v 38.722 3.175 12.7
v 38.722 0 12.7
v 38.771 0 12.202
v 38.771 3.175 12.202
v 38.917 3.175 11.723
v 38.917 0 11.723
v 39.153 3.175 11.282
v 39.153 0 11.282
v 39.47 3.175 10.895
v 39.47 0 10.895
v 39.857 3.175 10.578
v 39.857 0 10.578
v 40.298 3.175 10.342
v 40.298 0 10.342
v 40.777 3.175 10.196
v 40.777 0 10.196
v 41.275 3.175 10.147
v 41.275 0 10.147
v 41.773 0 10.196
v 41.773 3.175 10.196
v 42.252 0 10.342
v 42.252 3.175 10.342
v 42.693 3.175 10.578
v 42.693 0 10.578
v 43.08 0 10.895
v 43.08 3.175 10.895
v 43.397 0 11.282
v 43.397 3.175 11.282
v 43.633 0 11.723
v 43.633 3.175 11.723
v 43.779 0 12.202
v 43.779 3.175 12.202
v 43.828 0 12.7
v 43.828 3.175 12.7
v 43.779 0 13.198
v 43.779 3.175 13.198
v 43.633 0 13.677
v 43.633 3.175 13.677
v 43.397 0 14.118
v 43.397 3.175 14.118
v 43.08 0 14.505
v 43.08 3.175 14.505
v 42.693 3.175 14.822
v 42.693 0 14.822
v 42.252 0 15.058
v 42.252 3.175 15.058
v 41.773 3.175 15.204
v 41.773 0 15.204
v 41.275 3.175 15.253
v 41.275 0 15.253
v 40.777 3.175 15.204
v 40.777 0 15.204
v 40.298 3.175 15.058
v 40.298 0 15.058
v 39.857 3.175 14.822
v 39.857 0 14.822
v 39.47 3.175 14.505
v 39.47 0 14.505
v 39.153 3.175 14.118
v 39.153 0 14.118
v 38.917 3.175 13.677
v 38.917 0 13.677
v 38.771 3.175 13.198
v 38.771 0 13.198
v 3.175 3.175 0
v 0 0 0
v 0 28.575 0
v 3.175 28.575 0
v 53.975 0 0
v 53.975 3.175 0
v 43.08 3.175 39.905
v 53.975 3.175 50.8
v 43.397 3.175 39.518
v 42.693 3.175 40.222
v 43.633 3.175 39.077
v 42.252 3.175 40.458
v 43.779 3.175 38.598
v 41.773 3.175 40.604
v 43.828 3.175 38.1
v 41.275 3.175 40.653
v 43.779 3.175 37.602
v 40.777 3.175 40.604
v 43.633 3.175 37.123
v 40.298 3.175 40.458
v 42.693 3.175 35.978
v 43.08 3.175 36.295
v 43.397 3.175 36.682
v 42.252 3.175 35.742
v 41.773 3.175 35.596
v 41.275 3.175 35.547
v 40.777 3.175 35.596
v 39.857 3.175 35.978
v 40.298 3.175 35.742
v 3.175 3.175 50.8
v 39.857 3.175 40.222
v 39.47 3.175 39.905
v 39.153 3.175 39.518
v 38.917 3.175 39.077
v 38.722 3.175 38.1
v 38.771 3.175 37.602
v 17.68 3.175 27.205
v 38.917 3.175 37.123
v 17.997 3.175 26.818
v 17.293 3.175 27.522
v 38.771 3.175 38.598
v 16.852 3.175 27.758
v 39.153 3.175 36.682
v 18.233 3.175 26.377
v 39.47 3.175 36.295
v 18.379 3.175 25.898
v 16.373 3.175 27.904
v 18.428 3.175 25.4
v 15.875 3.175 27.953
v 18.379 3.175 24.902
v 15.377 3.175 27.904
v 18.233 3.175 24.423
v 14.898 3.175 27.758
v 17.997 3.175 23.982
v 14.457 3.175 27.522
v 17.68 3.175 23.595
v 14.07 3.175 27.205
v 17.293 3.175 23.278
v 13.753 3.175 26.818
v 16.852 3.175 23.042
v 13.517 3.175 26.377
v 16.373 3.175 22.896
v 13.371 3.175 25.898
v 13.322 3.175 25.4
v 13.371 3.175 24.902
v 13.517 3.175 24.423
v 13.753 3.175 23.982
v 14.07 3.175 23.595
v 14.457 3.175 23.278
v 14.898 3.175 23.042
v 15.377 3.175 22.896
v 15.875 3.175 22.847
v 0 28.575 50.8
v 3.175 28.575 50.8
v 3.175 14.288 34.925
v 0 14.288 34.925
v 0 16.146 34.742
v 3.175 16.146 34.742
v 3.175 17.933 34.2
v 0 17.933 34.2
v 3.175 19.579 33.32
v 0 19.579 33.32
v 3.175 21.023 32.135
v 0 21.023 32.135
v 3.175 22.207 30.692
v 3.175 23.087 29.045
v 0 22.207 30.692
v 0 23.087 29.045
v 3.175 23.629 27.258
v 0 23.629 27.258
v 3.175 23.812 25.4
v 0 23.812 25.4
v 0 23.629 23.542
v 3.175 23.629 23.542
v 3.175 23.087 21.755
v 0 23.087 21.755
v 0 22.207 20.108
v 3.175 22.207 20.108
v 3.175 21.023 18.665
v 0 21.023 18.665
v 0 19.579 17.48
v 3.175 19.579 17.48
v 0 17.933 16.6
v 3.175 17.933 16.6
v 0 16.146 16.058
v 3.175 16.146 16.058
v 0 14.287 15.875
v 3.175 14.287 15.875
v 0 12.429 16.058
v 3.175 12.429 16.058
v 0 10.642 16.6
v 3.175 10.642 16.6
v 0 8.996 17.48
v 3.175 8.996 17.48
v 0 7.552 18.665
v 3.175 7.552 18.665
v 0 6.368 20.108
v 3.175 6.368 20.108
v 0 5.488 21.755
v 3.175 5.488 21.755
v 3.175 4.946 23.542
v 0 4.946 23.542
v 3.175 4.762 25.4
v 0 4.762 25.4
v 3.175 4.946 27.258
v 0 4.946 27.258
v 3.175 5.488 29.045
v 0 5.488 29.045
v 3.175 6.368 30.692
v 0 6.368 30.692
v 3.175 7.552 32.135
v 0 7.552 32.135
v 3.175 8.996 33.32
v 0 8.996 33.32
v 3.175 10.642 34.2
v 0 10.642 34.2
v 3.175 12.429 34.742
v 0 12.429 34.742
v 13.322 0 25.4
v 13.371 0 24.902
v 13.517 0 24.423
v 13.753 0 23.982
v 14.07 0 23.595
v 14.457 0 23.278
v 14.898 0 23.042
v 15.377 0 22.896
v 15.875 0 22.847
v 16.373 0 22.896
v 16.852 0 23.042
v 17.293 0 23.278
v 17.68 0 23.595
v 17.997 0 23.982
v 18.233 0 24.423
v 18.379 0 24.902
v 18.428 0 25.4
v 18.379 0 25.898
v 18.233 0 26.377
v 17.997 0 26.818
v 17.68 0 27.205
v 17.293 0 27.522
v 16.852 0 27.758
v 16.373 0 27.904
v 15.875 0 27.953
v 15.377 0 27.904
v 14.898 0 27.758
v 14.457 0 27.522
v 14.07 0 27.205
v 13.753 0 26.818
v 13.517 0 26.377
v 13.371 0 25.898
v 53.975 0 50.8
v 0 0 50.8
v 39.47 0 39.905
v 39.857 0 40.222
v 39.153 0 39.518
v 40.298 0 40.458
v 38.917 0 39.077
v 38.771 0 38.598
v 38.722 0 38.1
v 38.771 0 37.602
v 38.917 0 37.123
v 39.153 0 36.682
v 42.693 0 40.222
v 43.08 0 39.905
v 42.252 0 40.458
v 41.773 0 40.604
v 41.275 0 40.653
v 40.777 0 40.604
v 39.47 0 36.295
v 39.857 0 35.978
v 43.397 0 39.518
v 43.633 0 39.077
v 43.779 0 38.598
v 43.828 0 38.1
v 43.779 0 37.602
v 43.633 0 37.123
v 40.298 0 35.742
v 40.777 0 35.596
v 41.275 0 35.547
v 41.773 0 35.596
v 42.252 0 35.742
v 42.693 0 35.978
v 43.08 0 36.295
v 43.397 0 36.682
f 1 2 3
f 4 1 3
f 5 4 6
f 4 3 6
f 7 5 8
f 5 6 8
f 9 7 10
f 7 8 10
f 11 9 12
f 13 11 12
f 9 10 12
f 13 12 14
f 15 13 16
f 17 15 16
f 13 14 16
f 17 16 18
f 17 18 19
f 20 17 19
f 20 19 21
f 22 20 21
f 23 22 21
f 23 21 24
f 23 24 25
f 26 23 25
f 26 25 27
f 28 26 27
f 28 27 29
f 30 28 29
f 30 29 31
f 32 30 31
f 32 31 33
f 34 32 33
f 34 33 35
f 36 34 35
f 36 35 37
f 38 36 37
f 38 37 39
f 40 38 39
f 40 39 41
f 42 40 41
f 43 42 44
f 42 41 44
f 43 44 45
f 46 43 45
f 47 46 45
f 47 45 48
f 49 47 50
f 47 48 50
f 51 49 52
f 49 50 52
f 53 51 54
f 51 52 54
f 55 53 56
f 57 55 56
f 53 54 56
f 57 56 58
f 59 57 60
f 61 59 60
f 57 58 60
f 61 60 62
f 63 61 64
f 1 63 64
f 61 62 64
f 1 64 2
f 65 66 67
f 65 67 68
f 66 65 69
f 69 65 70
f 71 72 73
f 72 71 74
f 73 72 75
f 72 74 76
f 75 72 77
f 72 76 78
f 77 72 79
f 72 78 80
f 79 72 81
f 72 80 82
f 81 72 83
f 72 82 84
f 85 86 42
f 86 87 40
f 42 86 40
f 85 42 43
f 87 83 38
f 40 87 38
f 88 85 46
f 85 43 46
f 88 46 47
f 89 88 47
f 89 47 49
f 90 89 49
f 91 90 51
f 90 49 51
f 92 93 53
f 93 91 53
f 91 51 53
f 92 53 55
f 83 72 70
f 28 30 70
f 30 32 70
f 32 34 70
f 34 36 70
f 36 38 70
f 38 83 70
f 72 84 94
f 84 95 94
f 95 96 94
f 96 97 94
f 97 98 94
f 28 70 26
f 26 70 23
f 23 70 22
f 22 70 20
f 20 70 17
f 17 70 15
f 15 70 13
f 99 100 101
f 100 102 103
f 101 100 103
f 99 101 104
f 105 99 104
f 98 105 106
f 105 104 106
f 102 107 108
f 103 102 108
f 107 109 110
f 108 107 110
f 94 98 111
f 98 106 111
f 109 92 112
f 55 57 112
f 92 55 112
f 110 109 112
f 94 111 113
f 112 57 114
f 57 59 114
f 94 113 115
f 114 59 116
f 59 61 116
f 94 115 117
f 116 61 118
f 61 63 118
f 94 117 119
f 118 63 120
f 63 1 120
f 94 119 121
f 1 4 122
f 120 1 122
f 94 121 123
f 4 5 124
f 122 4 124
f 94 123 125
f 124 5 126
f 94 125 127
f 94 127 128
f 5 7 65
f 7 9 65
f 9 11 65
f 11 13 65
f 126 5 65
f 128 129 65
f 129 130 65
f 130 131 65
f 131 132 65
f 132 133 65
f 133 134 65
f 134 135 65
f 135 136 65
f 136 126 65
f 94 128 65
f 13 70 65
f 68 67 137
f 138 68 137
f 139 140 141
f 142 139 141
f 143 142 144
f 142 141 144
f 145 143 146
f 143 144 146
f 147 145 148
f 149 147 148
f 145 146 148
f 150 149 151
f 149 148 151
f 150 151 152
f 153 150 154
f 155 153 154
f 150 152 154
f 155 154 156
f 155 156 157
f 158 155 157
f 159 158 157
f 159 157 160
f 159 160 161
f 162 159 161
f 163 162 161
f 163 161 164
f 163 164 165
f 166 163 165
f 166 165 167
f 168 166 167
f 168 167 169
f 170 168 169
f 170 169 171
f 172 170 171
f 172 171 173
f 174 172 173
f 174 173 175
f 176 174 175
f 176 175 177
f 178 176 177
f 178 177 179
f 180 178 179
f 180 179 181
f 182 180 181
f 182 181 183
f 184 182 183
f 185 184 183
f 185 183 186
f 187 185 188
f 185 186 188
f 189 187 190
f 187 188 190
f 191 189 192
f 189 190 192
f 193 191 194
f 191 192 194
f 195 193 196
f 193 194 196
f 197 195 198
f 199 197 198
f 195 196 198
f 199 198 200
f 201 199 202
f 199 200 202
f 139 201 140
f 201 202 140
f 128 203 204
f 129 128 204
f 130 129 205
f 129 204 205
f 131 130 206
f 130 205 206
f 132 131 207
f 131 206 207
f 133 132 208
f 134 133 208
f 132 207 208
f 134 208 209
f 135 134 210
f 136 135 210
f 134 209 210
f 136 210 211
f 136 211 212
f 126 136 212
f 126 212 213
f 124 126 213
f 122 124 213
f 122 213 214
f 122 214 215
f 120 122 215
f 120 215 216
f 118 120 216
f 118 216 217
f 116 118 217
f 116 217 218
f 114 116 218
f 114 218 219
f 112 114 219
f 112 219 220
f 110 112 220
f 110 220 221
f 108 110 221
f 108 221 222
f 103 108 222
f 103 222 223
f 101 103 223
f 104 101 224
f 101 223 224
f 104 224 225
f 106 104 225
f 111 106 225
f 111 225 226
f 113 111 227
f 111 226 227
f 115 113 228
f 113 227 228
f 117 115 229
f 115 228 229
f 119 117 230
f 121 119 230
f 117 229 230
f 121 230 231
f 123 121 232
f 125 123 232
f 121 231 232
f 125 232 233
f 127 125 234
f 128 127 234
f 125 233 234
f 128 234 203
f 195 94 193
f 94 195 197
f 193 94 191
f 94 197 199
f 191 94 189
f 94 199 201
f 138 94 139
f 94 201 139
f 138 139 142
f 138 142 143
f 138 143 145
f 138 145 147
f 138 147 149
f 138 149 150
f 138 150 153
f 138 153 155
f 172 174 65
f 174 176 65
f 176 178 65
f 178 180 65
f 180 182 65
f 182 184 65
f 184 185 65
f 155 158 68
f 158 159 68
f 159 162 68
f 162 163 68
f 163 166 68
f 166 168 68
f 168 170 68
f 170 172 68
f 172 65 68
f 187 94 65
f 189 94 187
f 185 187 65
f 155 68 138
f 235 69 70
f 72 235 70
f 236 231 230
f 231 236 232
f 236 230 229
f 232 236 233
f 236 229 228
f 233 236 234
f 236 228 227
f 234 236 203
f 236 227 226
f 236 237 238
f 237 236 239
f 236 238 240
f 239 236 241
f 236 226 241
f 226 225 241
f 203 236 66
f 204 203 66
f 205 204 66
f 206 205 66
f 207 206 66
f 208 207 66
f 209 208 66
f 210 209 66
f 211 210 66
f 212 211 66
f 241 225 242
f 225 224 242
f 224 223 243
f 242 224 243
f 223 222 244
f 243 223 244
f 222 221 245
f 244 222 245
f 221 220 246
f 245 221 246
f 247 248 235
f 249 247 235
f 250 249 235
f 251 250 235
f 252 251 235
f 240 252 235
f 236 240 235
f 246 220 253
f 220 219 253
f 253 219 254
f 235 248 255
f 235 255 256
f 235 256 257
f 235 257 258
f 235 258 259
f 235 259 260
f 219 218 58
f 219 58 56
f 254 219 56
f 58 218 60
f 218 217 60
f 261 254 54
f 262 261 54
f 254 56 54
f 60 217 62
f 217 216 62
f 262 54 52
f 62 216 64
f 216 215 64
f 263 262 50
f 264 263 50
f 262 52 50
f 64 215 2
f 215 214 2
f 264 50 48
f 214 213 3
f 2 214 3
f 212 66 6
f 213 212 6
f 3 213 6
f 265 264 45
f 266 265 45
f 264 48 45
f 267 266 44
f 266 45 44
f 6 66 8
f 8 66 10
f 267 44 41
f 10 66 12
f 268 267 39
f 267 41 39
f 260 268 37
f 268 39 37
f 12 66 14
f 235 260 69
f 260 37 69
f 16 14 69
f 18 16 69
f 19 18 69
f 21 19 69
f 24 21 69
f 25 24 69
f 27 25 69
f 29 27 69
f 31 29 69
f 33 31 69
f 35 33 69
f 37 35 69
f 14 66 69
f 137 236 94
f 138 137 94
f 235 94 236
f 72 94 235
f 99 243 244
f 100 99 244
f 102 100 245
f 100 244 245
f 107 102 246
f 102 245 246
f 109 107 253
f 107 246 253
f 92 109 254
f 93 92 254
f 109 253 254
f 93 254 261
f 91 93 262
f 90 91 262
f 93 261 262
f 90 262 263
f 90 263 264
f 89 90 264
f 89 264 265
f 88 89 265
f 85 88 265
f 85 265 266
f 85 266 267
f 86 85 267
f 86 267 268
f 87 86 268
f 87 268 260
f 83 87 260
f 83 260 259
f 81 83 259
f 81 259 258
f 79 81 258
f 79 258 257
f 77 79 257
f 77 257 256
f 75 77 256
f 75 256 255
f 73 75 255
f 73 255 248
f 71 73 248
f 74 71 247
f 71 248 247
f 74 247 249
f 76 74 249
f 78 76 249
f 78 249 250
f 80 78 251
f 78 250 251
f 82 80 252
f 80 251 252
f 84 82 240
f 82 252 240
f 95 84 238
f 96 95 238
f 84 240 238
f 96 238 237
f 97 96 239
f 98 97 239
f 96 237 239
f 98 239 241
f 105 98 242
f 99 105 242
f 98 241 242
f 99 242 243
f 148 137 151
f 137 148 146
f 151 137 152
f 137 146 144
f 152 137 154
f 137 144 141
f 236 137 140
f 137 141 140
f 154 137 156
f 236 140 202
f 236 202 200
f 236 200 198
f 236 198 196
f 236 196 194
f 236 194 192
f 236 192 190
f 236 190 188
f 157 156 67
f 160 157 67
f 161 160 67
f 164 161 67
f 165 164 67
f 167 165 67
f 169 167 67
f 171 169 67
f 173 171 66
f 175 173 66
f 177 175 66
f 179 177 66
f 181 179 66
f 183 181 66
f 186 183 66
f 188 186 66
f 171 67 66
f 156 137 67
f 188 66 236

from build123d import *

# Parameters (mm, degrees)
BOSS_EXTRUDE1_DEPTH = 50.8
SKETCH2_R           = 9.525
SKETCH2_W           = 50.8
SKETCH2_H           = 22.225
CUT_EXTRUDE1_DEPTH  = 50.8
SKETCH3_R           = 2.5527
CUT_EXTRUDE2_DEPTH  = 50.8


with BuildPart() as part:
    # Sketch1 → Boss-Extrude1 (new body)
    with BuildSketch(Plane.XY):
        Polygon((3.175, 50.8), (0, 50.8), (0, 0), (3.175, 0), (53.975, 0), (53.975, 3.175), (3.175, 3.175), align=None)
    extrude(amount=BOSS_EXTRUDE1_DEPTH)

    # Sketch2 → Cut-Extrude1 (cut)
    with BuildSketch(Plane.ZY):
        with Locations((25.4, 14.2875)):
            Circle(SKETCH2_R)
        with Locations((25.4, 39.6875)):
            Rectangle(SKETCH2_W, SKETCH2_H)
    extrude(amount=-CUT_EXTRUDE1_DEPTH, mode=Mode.SUBTRACT)

    # Sketch3 → Cut-Extrude2 (cut)
    with BuildSketch(Plane(origin=(0, 0, 0), x_dir=(-1, 0, 0), z_dir=(0, -1, 0))):
        with Locations((-15.875, -25.4)):
            Circle(SKETCH3_R)
        with Locations((-41.275, -38.1)):
            Circle(SKETCH3_R)
        with Locations((-41.275, -12.7)):
            Circle(SKETCH3_R)
    extrude(amount=-CUT_EXTRUDE2_DEPTH, mode=Mode.SUBTRACT)


solid = part.part
